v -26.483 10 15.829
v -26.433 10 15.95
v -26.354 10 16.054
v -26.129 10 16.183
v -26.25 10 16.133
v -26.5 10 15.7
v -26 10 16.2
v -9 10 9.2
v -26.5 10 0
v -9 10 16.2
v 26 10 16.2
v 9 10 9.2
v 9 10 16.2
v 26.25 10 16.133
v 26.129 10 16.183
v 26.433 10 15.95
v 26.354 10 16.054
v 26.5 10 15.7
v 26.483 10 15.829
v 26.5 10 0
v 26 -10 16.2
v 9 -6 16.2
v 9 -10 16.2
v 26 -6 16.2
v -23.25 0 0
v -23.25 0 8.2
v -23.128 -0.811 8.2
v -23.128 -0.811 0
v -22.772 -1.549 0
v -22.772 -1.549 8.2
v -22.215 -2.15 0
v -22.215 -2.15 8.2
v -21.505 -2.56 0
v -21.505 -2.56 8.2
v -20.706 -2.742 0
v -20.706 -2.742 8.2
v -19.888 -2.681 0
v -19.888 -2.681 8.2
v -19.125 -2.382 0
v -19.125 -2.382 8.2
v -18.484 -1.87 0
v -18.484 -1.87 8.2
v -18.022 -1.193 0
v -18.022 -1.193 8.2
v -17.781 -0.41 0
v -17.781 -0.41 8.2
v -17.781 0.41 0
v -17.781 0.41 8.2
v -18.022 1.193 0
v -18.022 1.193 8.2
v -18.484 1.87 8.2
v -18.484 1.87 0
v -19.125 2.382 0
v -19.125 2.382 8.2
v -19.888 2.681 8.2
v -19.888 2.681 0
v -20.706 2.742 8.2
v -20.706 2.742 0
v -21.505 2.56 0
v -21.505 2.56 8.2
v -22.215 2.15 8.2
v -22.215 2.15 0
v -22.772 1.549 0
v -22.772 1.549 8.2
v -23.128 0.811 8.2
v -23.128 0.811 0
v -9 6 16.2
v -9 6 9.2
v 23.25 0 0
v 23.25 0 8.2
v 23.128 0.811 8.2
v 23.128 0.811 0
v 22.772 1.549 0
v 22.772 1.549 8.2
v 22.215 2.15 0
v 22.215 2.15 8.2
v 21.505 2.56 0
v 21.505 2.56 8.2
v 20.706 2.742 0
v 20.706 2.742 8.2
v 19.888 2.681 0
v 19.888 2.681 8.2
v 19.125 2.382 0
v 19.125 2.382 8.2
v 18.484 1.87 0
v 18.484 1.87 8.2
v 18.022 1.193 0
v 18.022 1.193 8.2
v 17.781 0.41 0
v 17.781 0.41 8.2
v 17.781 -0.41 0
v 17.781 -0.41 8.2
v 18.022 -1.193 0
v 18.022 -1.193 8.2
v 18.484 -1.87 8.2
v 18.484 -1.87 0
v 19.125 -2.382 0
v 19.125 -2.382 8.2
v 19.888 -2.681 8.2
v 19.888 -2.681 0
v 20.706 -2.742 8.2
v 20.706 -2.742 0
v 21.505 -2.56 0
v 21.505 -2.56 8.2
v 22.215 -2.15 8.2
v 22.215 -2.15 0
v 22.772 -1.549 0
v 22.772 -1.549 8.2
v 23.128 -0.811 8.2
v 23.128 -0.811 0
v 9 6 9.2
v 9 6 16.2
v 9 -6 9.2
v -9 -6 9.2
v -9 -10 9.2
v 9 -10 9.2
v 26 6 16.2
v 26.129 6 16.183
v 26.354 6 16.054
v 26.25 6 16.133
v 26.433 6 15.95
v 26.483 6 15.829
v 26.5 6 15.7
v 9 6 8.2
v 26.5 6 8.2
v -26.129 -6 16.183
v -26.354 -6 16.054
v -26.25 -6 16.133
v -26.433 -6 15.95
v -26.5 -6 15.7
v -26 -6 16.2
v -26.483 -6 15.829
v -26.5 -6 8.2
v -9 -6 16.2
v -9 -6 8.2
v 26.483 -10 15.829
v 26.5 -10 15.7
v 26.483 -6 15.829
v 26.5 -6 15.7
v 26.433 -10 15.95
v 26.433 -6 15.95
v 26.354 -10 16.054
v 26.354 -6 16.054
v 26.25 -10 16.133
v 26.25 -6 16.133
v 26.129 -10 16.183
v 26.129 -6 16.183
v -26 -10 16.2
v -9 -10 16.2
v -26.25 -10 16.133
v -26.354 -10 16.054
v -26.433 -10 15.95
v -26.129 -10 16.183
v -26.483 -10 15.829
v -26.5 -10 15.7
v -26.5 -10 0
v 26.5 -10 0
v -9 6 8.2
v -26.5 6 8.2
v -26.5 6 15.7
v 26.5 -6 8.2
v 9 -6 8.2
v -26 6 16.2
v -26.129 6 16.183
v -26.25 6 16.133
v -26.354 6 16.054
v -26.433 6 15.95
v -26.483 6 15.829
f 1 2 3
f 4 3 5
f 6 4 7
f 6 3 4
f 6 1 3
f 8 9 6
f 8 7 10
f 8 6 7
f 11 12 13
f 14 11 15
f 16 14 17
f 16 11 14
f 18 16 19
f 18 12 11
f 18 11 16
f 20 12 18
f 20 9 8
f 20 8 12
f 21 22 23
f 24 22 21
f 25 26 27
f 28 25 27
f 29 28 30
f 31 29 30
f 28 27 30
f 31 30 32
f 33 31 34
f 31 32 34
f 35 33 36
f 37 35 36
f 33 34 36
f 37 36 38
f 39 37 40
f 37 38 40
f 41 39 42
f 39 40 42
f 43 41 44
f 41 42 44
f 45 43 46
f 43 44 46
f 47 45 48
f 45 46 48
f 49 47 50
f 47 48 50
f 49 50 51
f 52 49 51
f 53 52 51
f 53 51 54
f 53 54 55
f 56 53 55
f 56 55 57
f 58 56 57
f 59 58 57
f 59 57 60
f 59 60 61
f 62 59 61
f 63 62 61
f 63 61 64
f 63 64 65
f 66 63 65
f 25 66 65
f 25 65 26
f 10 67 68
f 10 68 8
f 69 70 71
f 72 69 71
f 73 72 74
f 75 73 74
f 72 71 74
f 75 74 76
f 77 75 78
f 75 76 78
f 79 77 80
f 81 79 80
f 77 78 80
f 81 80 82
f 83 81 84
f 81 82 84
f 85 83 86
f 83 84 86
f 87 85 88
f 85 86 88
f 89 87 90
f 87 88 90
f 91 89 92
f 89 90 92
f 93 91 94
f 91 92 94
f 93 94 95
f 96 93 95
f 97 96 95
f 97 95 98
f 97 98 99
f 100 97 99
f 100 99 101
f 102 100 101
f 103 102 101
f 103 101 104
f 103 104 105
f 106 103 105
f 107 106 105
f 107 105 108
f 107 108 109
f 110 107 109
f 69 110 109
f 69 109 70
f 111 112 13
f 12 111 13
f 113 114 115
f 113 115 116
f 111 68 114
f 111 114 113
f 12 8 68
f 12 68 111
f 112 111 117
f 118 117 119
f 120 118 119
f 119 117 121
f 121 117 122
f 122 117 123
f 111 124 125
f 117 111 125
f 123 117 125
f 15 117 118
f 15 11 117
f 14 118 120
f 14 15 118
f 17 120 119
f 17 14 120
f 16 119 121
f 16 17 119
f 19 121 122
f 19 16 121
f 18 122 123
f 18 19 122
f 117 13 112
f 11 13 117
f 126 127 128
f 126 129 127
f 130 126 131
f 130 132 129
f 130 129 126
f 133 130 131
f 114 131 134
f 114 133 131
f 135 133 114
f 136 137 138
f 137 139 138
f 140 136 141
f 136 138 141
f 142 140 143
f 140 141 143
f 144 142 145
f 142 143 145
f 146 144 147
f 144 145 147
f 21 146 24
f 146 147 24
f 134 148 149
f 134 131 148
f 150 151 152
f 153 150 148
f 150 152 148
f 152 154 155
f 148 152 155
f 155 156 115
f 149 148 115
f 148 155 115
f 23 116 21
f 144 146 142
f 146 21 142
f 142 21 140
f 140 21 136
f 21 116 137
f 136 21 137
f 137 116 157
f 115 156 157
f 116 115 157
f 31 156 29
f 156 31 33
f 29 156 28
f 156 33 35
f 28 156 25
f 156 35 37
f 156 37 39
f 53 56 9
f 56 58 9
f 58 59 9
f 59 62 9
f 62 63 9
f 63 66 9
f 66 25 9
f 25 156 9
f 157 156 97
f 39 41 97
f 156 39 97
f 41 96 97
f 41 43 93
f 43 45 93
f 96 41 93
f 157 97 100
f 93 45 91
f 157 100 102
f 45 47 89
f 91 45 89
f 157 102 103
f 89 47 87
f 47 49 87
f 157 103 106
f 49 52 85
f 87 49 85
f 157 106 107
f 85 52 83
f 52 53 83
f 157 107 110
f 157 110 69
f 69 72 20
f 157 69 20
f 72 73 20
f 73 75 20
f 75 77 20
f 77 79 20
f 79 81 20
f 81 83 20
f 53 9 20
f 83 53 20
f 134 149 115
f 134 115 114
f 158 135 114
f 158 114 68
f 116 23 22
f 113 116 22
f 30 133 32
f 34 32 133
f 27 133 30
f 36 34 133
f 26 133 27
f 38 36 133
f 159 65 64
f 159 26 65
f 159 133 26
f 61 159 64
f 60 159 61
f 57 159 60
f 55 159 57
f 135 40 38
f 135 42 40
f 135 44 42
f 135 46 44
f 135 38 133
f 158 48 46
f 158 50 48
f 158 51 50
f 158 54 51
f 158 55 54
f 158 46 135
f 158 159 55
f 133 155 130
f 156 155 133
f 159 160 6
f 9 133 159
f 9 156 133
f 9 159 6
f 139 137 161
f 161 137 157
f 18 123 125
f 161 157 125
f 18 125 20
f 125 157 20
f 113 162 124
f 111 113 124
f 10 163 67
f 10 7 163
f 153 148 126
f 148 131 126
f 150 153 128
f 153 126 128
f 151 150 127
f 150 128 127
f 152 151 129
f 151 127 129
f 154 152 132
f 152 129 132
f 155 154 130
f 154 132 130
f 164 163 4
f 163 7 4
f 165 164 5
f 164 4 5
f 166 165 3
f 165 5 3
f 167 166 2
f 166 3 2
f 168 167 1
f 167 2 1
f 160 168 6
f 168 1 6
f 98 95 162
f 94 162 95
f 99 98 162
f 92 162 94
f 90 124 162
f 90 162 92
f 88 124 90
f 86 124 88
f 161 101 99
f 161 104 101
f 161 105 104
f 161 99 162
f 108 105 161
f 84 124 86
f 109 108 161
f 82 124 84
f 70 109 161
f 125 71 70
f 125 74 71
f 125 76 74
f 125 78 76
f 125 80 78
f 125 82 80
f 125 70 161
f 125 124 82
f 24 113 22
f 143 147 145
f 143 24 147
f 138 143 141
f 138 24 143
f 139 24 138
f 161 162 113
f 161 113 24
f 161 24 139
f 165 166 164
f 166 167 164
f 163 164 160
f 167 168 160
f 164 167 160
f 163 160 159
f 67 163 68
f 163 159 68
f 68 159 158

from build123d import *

# Parameters (mm, degrees)
EXTRUDE_1_OUTLINE_W = 53
EXTRUDE_1_OUTLINE_H = 20
EXTRUDE_1_DEPTH     = 8.2
SKETCH_2_W          = 18
SKETCH_2_H          = 20
EXTRUDE_2_DEPTH     = 1
SKETCH_3_R          = 2.75
CUT_EXTRUDE_1_DEPTH = 30.48711583
SKETCH_4_W          = 17.5
SKETCH_4_H          = 4
EXTRUDE_3_DEPTH     = 8
FILLET_1_R          = 0.5


# Read off the part's stored shape, not the designer's step: 보스-돌출1
with BuildPart() as part:
    # 보스-돌출1 outline → 보스-돌출1 (new body)
    with BuildSketch(Plane.XY):
        Rectangle(EXTRUDE_1_OUTLINE_W, EXTRUDE_1_OUTLINE_H)
    extrude(amount=EXTRUDE_1_DEPTH)

    # 스케치2 → 보스-돌출2 (add)
    with BuildSketch(Plane.XY.offset(8.2)):
        Rectangle(SKETCH_2_W, SKETCH_2_H)
    extrude(amount=EXTRUDE_2_DEPTH)

    # 스케치3 → 컷-돌출1 (cut, through all)
    with BuildSketch(Plane.XY.offset(8.2)):
        with Locations((20.5, 0)):
            Circle(SKETCH_3_R)
        with Locations(Location((-20.5, 0, 0), (0, 0, 180))):
            Circle(SKETCH_3_R)
    extrude(amount=-CUT_EXTRUDE_1_DEPTH, mode=Mode.SUBTRACT)

    # 스케치4 → 보스-돌출3 (add)
    with BuildSketch(Plane.XY.offset(8.2)):
        with Locations((17.75, -8)):
            Rectangle(SKETCH_4_W, SKETCH_4_H)
        with Locations((17.75, 8)):
            Rectangle(SKETCH_4_W, SKETCH_4_H)
        with Locations((-17.75, 8)):
            Rectangle(SKETCH_4_W, SKETCH_4_H)
        with Locations((-17.75, -8)):
            Rectangle(SKETCH_4_W, SKETCH_4_H)
    extrude(amount=EXTRUDE_3_DEPTH)

    # 필렛1
    fillet_1_edges = [part.edges().sort_by_distance(p)[0] for p in [
        (26.5, -8, 16.2),
        (26.5, 8, 16.2),
        (-26.5, 8, 16.2),
        (-26.5, -8, 16.2),
    ]]
    fillet(fillet_1_edges, radius=FILLET_1_R)


solid = part.part
